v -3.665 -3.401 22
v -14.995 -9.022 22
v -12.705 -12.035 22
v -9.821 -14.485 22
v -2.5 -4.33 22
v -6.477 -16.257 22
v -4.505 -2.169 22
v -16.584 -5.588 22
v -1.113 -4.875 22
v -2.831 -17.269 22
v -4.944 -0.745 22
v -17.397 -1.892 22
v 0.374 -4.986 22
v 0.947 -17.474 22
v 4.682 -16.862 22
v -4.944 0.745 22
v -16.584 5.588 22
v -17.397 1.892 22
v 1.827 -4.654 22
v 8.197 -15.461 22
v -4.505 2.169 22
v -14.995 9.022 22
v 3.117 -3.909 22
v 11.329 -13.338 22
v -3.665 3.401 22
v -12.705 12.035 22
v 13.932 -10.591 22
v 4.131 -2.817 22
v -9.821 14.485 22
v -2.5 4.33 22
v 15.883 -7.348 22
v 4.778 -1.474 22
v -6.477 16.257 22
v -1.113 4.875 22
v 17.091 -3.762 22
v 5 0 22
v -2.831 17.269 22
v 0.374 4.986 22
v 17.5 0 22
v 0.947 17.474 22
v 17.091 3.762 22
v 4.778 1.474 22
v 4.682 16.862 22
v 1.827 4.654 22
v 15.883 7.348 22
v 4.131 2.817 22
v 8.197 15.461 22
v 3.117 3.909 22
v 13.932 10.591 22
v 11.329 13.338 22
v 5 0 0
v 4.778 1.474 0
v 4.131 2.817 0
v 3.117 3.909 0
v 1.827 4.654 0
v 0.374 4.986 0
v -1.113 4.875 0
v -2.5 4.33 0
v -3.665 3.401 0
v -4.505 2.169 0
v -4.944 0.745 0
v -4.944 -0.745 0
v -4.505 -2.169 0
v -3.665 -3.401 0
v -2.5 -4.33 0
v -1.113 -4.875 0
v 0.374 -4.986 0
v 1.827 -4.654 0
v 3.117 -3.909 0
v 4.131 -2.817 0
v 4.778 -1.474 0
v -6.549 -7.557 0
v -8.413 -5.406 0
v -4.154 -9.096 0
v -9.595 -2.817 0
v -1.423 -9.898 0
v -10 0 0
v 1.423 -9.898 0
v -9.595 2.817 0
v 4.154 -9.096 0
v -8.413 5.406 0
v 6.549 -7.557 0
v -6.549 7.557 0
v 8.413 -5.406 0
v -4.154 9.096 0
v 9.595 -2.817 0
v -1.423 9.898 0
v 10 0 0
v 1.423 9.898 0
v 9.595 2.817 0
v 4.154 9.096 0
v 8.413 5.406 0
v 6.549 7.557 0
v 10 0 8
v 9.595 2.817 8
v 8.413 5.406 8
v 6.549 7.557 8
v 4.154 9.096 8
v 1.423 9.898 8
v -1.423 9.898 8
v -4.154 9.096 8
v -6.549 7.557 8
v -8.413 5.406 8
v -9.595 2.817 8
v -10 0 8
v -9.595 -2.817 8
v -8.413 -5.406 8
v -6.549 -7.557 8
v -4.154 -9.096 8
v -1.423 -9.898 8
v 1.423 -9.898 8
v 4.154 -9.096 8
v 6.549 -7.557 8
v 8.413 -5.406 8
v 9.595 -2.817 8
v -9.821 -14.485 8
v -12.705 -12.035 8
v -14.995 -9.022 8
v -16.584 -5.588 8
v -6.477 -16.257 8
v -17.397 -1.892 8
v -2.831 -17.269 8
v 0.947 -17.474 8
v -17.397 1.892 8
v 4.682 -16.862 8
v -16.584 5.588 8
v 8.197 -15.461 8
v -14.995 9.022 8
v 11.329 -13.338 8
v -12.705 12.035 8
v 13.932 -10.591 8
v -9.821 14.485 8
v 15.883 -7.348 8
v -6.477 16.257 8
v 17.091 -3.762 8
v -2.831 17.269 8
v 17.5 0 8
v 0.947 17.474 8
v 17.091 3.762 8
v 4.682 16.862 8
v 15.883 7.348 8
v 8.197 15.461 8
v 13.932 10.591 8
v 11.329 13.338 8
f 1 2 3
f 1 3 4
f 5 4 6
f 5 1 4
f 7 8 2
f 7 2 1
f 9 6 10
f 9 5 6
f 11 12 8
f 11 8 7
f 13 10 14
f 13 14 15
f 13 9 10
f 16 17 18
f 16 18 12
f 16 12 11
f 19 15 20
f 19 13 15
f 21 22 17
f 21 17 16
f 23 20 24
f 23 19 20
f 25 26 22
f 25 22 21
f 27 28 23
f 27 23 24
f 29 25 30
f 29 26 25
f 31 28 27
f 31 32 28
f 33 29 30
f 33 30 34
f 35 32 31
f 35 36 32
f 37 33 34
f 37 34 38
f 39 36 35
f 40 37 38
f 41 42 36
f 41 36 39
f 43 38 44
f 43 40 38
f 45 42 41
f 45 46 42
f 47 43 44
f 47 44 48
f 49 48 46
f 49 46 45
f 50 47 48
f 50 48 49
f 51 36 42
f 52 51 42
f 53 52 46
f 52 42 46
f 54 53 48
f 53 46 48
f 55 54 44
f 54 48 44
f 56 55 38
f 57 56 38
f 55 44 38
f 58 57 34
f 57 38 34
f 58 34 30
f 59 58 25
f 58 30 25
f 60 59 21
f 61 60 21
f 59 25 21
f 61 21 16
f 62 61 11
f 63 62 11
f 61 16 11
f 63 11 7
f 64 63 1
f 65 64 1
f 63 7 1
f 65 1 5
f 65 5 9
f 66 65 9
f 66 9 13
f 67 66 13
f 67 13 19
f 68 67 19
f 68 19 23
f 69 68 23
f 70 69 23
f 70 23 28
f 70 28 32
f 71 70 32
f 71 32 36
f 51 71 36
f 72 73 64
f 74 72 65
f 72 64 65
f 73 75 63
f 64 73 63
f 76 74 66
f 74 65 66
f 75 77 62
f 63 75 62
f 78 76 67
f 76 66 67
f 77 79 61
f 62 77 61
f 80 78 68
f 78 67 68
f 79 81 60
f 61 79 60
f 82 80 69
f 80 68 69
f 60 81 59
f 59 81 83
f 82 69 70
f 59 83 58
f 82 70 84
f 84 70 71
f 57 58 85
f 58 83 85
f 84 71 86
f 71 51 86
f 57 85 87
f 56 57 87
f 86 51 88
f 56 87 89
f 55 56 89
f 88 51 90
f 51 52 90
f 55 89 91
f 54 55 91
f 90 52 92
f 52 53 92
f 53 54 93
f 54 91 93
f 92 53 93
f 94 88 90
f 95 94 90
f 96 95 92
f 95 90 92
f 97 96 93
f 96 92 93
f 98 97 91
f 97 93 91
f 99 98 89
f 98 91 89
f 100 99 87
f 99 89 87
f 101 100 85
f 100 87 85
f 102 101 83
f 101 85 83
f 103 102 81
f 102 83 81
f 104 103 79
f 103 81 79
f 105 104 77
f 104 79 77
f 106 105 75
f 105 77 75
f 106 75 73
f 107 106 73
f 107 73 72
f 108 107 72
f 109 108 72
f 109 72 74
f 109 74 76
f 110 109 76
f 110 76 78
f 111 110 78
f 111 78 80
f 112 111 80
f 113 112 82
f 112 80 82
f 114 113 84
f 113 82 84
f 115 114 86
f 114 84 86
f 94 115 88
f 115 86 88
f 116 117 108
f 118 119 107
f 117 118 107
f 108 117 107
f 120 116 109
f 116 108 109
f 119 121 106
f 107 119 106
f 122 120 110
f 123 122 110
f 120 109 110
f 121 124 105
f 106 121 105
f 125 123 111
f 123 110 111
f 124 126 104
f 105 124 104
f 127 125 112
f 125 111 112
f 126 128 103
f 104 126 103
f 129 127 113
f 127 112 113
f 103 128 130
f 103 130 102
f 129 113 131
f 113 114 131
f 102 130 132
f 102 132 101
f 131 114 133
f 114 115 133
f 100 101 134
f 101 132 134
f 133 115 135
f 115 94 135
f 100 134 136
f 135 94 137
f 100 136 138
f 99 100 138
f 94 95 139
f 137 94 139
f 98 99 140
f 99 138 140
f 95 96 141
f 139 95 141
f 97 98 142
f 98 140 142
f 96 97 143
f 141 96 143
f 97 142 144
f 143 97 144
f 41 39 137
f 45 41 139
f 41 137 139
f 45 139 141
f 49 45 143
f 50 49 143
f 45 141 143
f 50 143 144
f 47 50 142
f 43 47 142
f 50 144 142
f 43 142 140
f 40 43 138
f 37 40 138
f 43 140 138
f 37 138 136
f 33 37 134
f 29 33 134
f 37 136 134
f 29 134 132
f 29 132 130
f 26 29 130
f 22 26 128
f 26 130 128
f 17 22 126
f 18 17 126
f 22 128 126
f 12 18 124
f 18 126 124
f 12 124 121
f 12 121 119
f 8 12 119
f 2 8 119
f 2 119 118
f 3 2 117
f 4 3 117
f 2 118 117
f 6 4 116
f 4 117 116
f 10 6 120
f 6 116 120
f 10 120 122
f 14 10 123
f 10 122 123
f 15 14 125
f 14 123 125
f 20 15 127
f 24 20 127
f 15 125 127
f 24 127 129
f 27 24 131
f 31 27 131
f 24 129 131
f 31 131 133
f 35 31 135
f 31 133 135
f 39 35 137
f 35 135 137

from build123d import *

# Parameters (mm, degrees)
F0_R     = 10
F1_DEPTH = 8
F2_R     = 17.5
F3_DEPTH = 14
F4_R     = 5
F5_DEPTH = 40


with BuildPart() as f1:
    # F0 (on Top) → F1 (new body)
    with BuildSketch(Plane.XY):
        Circle(F0_R)
    extrude(amount=F1_DEPTH)

    # F2 (on face) → F3 (join)
    with BuildSketch(Plane.XY.offset(8)):
        Circle(F2_R)
    extrude(amount=F3_DEPTH)

    # F4 (on face) → F5 (cut)
    with BuildSketch(Plane.XY.offset(22)):
        Circle(F4_R)
    extrude(amount=-F5_DEPTH, mode=Mode.SUBTRACT)


solid = f1.part
